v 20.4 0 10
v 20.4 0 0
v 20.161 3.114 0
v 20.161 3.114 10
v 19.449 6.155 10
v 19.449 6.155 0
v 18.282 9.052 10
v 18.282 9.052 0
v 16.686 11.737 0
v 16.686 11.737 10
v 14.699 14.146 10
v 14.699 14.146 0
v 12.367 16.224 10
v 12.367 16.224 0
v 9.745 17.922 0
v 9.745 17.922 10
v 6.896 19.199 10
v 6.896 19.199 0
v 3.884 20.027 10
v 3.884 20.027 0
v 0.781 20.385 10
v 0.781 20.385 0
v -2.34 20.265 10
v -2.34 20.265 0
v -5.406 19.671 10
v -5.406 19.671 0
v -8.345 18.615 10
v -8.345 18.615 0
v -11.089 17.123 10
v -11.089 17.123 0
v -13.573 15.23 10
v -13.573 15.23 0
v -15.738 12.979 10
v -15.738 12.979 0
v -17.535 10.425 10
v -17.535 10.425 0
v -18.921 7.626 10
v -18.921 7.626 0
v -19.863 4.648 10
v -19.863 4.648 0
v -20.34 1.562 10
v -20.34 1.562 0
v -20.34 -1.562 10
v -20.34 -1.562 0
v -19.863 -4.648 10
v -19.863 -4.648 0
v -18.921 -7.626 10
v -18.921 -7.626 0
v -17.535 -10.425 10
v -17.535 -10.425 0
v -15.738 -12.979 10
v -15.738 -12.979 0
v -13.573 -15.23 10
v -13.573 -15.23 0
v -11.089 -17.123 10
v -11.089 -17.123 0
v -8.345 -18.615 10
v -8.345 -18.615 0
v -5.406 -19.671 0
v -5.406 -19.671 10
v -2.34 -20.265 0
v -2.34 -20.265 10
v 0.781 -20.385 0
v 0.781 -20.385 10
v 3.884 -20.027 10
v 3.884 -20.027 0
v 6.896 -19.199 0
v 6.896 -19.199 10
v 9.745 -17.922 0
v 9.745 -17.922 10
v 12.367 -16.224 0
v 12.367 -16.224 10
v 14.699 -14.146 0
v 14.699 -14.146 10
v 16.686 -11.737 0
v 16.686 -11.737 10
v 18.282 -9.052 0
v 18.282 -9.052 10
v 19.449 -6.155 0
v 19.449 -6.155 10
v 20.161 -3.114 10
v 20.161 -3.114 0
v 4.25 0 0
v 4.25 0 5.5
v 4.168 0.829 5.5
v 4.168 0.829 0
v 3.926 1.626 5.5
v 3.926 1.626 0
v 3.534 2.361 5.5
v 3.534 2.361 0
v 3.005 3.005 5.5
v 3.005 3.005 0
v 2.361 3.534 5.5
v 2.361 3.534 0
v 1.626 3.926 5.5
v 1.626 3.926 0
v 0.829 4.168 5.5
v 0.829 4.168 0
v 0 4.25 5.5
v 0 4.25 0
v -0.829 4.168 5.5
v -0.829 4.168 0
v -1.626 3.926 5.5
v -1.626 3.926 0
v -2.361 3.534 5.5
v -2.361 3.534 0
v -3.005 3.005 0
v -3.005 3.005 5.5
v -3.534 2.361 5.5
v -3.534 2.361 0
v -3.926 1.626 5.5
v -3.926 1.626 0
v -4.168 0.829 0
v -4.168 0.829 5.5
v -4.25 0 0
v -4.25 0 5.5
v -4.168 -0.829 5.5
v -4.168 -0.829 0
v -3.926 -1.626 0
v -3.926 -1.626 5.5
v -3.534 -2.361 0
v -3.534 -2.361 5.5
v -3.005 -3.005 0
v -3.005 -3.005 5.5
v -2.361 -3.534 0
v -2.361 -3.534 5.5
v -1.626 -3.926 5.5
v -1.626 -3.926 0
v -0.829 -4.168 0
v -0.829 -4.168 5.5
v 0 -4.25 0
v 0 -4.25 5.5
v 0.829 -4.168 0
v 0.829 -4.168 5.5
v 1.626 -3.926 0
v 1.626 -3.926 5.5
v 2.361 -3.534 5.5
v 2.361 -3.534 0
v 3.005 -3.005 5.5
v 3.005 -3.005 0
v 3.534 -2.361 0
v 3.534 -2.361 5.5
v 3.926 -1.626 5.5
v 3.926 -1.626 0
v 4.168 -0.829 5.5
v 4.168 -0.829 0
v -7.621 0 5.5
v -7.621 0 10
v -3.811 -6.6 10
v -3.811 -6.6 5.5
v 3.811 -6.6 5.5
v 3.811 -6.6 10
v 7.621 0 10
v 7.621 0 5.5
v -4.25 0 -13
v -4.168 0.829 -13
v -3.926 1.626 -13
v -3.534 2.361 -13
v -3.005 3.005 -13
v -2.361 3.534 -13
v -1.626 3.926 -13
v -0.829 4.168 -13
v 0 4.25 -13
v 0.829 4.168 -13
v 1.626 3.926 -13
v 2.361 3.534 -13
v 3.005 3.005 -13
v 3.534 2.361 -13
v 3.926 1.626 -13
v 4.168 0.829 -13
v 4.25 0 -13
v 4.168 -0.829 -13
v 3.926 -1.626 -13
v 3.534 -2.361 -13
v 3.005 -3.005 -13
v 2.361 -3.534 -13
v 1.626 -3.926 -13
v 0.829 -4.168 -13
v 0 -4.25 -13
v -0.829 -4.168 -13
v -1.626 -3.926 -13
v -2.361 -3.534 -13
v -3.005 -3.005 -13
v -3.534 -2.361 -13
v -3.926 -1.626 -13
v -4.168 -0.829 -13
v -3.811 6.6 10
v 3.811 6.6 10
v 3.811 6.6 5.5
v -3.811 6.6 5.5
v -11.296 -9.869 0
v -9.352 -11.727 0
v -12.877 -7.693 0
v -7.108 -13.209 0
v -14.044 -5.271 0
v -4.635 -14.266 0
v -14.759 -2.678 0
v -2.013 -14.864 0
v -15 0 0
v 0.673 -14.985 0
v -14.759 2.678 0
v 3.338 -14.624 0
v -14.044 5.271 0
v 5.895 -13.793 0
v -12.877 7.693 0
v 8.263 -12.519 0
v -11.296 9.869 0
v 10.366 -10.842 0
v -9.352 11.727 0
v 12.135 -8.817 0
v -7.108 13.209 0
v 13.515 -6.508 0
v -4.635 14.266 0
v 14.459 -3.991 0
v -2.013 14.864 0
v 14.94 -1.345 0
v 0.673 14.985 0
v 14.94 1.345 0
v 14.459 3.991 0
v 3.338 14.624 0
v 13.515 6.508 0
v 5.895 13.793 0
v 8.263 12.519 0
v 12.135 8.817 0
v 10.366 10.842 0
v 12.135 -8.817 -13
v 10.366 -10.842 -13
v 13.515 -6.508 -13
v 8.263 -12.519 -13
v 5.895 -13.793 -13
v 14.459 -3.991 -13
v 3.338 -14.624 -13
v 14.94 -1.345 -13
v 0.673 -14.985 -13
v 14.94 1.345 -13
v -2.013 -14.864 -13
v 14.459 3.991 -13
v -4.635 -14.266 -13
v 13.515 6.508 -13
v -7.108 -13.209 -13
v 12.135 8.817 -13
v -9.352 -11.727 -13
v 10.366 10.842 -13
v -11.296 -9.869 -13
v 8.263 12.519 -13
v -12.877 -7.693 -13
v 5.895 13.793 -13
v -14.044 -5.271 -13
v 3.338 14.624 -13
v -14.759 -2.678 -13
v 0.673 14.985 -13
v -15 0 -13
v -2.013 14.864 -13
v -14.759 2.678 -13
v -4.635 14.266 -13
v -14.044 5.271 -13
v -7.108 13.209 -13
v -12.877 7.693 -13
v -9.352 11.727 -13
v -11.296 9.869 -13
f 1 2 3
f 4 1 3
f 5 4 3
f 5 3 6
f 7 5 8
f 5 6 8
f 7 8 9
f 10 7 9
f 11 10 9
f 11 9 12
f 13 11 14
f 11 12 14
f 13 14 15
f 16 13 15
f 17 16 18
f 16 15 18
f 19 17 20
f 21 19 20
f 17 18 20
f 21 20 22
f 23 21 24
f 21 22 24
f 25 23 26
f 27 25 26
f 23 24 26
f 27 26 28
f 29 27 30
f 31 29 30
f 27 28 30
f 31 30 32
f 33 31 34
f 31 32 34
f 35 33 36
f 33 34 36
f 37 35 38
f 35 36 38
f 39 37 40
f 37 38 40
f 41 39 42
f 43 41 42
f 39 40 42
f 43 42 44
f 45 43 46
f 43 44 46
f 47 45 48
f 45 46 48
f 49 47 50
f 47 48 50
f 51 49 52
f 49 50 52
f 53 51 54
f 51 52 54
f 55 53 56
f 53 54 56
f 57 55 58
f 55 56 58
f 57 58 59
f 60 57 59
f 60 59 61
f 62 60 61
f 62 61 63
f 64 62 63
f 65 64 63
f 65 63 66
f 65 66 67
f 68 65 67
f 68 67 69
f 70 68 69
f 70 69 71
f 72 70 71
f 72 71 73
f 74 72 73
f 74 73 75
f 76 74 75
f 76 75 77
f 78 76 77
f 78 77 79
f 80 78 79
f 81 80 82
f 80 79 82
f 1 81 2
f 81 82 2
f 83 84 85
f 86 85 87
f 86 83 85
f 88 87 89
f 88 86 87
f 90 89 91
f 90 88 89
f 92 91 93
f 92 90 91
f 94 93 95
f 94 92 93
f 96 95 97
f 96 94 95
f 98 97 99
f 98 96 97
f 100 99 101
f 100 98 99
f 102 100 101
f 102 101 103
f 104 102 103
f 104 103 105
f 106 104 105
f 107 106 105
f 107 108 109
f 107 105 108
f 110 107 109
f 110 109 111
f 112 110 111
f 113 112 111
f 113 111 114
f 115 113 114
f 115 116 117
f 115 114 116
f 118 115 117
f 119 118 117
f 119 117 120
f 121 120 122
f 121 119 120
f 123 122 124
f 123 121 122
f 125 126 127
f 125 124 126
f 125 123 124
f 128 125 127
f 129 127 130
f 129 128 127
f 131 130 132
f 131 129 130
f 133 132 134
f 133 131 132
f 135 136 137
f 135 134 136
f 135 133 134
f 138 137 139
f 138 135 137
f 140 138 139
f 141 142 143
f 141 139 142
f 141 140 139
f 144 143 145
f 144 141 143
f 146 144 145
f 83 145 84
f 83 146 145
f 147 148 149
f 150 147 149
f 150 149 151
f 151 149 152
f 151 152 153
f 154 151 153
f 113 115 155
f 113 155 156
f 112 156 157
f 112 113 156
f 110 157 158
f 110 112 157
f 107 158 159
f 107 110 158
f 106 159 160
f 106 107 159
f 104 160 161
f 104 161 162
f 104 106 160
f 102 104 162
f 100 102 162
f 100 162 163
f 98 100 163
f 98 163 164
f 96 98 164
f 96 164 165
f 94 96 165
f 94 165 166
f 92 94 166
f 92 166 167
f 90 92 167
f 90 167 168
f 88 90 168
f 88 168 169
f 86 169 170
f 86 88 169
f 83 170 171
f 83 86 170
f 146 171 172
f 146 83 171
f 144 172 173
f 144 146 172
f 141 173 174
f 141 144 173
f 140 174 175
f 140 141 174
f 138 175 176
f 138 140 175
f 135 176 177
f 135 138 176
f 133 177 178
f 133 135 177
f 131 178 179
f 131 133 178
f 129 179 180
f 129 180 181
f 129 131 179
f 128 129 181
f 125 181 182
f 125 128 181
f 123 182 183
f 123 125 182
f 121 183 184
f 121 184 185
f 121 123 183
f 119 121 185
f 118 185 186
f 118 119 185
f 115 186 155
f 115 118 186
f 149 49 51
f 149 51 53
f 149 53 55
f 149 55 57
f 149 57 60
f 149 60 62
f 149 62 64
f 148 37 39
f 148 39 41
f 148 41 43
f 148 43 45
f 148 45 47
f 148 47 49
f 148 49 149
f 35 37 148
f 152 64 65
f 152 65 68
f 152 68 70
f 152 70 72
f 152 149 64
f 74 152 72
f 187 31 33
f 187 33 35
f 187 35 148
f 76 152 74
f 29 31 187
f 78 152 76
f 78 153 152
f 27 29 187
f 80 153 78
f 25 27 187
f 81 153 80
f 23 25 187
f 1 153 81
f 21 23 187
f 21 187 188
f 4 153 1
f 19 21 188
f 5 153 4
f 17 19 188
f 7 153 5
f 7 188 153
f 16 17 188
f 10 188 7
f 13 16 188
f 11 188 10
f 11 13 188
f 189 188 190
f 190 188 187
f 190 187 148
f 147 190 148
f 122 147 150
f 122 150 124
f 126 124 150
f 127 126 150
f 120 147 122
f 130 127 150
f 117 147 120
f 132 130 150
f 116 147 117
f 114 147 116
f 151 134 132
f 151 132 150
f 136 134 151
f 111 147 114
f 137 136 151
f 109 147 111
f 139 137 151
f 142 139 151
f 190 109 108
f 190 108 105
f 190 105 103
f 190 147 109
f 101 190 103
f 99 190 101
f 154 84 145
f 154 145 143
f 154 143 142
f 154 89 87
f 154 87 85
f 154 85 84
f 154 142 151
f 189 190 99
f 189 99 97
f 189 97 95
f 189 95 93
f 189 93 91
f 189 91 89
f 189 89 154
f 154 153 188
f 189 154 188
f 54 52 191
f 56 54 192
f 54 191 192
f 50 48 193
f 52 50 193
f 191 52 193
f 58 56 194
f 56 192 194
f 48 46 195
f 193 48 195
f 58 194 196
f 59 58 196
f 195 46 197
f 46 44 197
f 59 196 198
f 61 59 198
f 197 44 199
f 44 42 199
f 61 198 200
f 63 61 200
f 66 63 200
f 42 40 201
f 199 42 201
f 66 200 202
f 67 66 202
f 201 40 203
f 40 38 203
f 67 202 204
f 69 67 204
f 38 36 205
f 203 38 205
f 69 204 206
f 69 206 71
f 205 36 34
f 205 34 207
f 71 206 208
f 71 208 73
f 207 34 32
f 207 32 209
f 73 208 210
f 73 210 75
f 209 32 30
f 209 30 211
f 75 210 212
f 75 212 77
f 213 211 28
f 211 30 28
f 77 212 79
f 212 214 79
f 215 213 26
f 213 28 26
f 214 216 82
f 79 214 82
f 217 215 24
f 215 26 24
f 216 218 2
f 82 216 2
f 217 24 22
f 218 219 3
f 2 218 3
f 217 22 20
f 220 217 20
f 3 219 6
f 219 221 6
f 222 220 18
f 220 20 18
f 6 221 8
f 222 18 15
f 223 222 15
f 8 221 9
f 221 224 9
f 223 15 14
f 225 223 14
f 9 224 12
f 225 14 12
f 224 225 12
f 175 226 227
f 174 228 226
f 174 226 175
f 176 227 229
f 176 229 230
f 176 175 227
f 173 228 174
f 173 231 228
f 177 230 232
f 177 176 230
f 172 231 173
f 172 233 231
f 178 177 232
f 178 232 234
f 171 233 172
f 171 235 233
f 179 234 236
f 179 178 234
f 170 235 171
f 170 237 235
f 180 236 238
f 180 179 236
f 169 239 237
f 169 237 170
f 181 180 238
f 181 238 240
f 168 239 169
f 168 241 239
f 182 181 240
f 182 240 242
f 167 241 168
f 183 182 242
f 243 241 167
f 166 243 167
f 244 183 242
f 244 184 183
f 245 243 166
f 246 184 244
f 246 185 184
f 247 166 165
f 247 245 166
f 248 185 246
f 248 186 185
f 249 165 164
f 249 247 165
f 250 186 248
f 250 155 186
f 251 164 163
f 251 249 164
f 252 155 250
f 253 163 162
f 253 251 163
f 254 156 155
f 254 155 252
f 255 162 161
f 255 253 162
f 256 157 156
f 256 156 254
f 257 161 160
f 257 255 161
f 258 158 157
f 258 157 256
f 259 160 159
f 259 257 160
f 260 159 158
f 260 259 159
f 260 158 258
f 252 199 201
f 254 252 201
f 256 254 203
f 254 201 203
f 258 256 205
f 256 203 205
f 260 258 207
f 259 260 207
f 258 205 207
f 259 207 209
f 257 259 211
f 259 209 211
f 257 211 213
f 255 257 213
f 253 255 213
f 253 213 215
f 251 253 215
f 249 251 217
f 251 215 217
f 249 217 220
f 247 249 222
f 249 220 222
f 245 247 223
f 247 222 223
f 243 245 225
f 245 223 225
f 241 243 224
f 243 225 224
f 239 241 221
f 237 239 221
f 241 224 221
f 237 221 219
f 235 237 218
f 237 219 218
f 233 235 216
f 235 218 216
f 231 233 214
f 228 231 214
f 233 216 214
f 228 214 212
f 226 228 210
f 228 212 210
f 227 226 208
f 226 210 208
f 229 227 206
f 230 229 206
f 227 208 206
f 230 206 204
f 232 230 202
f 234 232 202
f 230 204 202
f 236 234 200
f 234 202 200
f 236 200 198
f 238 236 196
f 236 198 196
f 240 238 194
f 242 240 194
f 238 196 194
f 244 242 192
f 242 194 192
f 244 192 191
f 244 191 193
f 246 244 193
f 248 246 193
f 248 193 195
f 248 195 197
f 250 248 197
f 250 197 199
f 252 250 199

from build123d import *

# Parameters (mm, degrees)
ESBO_O1_R                = 20.4
ESBO_O1_R_2              = 4.25
RESSALTO_EXTRUS_O1_DEPTH = 10
CORTE_EXTRUS_O1_DEPTH    = 4.5
ESBO_O5_R                = 15
ESBO_O5_R_2              = 4.25
RESSALTO_EXTRUS_O2_DEPTH = 13


with BuildPart() as part:
    # Esboço1 → Ressalto-extrusão1 (new body)
    with BuildSketch(Plane.XY):
        Circle(ESBO_O1_R)
        Circle(ESBO_O1_R_2, mode=Mode.SUBTRACT)
    extrude(amount=RESSALTO_EXTRUS_O1_DEPTH)

    # Esboço2 → Corte-extrusão1 (cut)
    with BuildSketch(Plane.XY.offset(10)):
        Polygon((3.810511777, -6.6), (7.621023553, 0), (3.810511777, 6.6), (-3.810511777, 6.6), (-7.621023553, 0), (-3.810511777, -6.6), align=None)
    extrude(amount=-CORTE_EXTRUS_O1_DEPTH, mode=Mode.SUBTRACT)

    # Esboço5 → Ressalto-extrusão2 (add)
    with BuildSketch(Plane(origin=(0, 0, 0), x_dir=(-1, 0, 0), z_dir=(0, 0, -1))):
        Circle(ESBO_O5_R)
        Circle(ESBO_O5_R_2, mode=Mode.SUBTRACT)
    extrude(amount=RESSALTO_EXTRUS_O2_DEPTH)


solid = part.part
